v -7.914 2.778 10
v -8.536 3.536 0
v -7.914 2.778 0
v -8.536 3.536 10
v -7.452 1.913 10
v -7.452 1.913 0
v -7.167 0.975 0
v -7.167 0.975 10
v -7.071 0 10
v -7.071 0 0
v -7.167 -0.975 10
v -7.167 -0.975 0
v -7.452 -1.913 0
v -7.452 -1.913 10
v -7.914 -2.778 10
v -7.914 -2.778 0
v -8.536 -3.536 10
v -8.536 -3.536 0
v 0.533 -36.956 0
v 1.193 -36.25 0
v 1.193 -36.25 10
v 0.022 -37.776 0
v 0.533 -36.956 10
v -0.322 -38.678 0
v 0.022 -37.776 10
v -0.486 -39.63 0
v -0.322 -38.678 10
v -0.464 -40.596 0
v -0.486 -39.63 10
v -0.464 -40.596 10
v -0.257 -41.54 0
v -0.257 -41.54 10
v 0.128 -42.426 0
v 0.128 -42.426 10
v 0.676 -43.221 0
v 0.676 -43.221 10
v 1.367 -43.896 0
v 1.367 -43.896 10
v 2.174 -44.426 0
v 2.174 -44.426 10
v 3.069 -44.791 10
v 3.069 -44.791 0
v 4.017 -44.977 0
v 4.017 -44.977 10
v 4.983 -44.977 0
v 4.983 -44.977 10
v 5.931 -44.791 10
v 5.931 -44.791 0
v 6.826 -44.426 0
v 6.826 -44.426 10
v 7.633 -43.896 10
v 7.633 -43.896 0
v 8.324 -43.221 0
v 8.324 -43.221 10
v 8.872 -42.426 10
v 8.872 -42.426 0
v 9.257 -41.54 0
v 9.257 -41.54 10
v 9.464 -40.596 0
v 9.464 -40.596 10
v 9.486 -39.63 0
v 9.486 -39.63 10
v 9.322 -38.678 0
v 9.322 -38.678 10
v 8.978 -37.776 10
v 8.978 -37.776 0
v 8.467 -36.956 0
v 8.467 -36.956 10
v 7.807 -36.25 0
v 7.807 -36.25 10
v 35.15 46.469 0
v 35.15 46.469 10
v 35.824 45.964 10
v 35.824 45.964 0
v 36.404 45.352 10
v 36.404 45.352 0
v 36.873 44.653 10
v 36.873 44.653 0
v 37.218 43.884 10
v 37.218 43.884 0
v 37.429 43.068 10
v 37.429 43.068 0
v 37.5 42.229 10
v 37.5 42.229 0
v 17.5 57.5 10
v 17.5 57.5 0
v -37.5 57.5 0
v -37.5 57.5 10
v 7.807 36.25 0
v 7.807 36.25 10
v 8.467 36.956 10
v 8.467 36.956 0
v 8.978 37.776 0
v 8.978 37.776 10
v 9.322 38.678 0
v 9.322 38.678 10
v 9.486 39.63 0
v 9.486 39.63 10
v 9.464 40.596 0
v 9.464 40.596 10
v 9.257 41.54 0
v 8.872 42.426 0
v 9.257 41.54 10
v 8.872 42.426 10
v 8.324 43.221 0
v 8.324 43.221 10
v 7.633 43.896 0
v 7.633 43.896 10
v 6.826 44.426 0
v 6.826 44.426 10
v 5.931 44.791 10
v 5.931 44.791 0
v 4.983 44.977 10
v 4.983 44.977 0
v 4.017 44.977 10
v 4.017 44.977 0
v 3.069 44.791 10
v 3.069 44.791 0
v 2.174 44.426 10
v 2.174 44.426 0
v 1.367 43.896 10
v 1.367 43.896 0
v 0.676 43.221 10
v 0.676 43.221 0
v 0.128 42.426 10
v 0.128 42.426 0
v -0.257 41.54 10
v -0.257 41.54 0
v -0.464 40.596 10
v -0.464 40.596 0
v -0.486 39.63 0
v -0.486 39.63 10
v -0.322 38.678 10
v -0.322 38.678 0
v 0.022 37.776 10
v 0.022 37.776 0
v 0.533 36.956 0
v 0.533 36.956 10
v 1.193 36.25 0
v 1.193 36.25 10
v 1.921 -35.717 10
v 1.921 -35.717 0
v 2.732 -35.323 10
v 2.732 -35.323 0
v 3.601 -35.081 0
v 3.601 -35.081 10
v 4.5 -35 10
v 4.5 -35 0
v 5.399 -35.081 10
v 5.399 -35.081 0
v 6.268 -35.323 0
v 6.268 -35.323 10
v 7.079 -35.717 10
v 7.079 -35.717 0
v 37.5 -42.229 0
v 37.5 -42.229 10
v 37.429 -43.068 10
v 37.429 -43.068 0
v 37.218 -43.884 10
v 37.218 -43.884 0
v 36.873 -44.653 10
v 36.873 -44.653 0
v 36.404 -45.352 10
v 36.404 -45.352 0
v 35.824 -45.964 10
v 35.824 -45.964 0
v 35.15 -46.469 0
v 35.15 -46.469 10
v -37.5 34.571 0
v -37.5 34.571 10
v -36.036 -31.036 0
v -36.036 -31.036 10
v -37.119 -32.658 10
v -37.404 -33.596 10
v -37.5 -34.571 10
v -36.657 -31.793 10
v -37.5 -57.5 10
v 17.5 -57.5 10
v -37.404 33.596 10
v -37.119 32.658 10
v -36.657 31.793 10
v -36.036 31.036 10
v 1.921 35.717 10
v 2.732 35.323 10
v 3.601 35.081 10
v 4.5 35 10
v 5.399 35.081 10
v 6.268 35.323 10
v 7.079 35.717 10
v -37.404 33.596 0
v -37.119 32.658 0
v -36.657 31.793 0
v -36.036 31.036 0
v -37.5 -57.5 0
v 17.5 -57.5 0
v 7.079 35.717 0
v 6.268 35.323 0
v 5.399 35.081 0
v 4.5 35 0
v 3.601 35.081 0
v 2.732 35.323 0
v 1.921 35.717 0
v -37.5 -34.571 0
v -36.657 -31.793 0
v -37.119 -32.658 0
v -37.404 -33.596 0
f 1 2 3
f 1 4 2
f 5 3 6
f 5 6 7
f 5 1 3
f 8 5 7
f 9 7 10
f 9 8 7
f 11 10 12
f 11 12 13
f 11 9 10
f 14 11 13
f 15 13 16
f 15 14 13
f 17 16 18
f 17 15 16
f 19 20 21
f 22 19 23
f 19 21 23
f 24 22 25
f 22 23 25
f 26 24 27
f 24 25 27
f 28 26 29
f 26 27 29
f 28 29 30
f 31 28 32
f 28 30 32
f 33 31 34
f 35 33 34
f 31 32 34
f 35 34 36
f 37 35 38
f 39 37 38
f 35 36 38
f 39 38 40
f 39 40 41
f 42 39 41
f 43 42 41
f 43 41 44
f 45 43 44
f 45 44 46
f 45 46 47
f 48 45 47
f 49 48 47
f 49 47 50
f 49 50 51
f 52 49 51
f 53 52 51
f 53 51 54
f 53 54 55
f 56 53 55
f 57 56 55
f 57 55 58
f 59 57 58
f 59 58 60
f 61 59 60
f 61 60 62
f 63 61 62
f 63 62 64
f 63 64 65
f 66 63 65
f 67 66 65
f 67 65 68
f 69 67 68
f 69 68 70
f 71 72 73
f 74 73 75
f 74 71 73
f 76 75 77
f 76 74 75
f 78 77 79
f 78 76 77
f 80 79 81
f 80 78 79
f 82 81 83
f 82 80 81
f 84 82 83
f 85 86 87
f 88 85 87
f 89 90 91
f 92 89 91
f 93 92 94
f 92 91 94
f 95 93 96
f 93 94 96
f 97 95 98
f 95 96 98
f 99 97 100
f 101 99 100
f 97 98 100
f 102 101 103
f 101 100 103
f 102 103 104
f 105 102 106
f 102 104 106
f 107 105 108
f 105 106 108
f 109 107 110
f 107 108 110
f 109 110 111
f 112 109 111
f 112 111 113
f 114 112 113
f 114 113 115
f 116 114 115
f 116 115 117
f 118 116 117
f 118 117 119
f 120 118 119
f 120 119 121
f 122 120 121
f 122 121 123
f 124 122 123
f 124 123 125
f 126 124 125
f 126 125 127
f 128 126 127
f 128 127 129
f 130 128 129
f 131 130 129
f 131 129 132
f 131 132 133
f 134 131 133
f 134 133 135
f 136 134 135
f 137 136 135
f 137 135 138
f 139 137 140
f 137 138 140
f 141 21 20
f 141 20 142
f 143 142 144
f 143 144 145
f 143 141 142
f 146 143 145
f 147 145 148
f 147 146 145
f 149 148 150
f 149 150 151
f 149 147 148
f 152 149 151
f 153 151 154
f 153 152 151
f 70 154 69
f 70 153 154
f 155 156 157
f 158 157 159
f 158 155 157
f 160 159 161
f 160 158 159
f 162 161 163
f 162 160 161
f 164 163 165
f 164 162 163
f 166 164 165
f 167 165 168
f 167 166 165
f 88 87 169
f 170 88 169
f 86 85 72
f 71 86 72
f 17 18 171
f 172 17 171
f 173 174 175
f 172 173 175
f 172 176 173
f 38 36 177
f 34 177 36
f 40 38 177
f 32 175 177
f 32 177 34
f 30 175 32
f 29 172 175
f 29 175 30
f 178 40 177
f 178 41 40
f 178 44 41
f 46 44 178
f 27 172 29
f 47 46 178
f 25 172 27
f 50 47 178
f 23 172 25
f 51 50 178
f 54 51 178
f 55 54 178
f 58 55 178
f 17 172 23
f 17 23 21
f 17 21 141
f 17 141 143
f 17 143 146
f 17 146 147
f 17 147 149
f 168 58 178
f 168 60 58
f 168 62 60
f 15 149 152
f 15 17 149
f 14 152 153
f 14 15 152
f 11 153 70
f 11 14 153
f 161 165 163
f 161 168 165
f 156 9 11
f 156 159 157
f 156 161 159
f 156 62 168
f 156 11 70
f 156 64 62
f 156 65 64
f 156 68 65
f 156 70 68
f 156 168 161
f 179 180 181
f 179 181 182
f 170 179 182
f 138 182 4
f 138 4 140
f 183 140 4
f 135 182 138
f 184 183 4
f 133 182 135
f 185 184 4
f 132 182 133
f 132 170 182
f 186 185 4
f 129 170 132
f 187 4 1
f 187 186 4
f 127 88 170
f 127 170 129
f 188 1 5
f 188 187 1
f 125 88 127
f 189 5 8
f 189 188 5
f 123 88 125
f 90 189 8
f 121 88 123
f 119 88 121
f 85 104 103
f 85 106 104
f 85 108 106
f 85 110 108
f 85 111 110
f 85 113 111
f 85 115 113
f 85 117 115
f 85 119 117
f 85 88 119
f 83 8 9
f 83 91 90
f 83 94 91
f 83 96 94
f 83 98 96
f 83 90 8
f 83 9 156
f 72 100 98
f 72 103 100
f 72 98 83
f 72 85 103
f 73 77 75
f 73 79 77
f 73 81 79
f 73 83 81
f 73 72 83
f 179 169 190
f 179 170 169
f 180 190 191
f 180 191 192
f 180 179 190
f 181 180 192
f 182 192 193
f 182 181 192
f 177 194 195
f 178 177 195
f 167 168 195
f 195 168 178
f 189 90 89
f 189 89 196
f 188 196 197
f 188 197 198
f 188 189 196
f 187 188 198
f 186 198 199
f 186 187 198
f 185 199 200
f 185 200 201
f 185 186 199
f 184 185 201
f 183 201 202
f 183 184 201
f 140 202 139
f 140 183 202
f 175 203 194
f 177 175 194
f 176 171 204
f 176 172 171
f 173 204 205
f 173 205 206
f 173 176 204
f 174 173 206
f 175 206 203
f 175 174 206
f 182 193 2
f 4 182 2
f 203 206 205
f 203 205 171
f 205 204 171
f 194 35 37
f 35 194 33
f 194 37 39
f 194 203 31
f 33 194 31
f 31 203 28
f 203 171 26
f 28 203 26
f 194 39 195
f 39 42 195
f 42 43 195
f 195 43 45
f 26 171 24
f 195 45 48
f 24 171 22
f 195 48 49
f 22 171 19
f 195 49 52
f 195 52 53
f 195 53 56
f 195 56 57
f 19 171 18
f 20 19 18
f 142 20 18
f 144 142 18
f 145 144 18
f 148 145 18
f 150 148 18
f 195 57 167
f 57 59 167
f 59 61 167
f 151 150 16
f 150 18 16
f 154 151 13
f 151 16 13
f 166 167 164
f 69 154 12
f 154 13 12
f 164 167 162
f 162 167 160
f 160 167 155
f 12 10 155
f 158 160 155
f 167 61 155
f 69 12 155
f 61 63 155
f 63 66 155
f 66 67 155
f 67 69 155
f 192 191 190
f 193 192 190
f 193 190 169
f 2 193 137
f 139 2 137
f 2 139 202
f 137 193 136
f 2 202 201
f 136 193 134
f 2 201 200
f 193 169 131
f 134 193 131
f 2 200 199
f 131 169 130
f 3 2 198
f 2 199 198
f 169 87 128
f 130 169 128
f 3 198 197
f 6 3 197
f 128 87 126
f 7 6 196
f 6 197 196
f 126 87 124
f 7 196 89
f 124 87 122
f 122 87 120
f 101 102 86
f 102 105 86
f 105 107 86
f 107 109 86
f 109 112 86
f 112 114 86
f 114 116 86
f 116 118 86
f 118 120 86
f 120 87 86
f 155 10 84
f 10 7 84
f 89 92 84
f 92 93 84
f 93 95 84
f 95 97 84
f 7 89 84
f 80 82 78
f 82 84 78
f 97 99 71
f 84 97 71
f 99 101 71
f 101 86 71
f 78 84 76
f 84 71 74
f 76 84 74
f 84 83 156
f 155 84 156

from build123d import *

# Parameters (mm, degrees)
EXTRUDE_1_DEPTH     = 10
FILLET_1_R          = 5
SKETCH_2_W          = 14.503098638
SKETCH_2_H          = 45
EXTRUDE_4_DEPTH     = 10
FILLET_3_R          = 5
SKETCH_3_R          = 5
CUT_EXTRUDE_2_DEPTH = 82.929848041
FILLET_4_R          = 5
SKETCH_4_R          = 5
CUT_EXTRUDE_5_DEPTH = 70.372184628
EXTRUDE_7_DEPTH     = 10


with BuildPart() as part:
    # 草图1 → 凸台-拉伸1 (new body)
    with BuildSketch(Plane.XY):
        Polygon((37.5, 57.5), (-37.5, 57.5), (-37.5, 32.5), (-5, 0), (-37.5, -32.5), (-37.5, -57.5), (37.5, -57.5), align=None)
    extrude(amount=EXTRUDE_1_DEPTH)

    # 圆角1
    fillet_1_edges = [part.edges().sort_by_distance(p)[0] for p in [
        (-5, 0, 5),
        (-37.5, 32.5, 5),
        (-37.5, -32.5, 5),
    ]]
    fillet(fillet_1_edges, radius=FILLET_1_R)

    # 草图2 → 凸台-拉伸4 (add)
    with BuildSketch(Plane.XY.offset(10)):
        Polygon((37.5, 57.5), (37.5, 0), (42.996901362, 0), (42.996901362, 45), (57.5, 45), align=None)
        with Locations((50.248450681, 22.5)):
            Rectangle(SKETCH_2_W, SKETCH_2_H)
        with Locations((50.248450681, -22.5)):
            Rectangle(SKETCH_2_W, SKETCH_2_H)
        Polygon((37.5, 0), (37.5, -57.5), (57.5, -45), (42.996901362, -45), (42.996901362, 0), align=None)
    extrude(amount=-EXTRUDE_4_DEPTH)

    # 圆角3
    fillet_3_edges = [part.edges().sort_by_distance(p)[0] for p in [
        (57.5, -45, 5),
        (57.5, 45, 5),
    ]]
    fillet(fillet_3_edges, radius=FILLET_3_R)

    # 草图3 → 切除-拉伸2 (cut, through all)
    with BuildSketch(Plane.XY.offset(10)):
        Polygon((17.5, 57.5), (37.5, 45), (37.5, 57.5), align=None)
        with BuildLine():
            Line((37.5, 57.5), (37.5, -57.5))
            Line((37.5, -57.5), (55.1499947, -46.468753312))
            ThreePointArc((55.1499947, -46.468753312), (56.873212406, -44.652604454), (57.5, -42.228761792))
            Line((57.5, -42.228761792), (57.5, 42.228761792))
            ThreePointArc((57.5, 42.228761792), (56.873212406, 44.652604454), (55.1499947, 46.468753312))
            Line((55.1499947, 46.468753312), (37.5, 57.5))
        make_face()
        Polygon((37.5, -45), (17.5, -57.5), (37.5, -57.5), align=None)
        with Locations((4.5, -32.5)):
            Circle(SKETCH_3_R)
        with Locations((4.5, 32.5)):
            Circle(SKETCH_3_R)
    extrude(amount=-CUT_EXTRUDE_2_DEPTH, mode=Mode.SUBTRACT)

    # 圆角4
    fillet_4_edges = [part.edges().sort_by_distance(p)[0] for p in [
        (37.5, -45, 5),
        (37.5, 45, 5),
    ]]
    fillet(fillet_4_edges, radius=FILLET_4_R)

    # 草图4 → 切除-拉伸5 (cut, through all)
    with BuildSketch(Plane.XY.offset(10)):
        with Locations((4.5, 40)):
            Circle(SKETCH_4_R)
        with Locations((4.5, 32.5)):
            Circle(SKETCH_4_R)
        with Locations((4.5, -40)):
            Circle(SKETCH_4_R)
        with Locations((4.5, -32.5)):
            Circle(SKETCH_4_R)
    extrude(amount=-CUT_EXTRUDE_5_DEPTH, mode=Mode.SUBTRACT)

    # 草图7 → 凸台-拉伸7 (add)
    with BuildSketch(Plane.XY.offset(10)):
        with BuildLine():
            ThreePointArc((1.192810861, 36.25), (2.442810861, 27.942810861), (9.5, 32.5))
            ThreePointArc((9.5, 32.5), (9.057189139, 34.557189139), (7.807189139, 36.25))
            ThreePointArc((7.807189139, 36.25), (4.5, 35), (1.192810861, 36.25))
        make_face()
        with BuildLine():
            ThreePointArc((7.807189139, -36.25), (9.057189139, -34.557189139), (9.5, -32.5))
            ThreePointArc((9.5, -32.5), (2.442810861, -27.942810861), (1.192810861, -36.25))
            ThreePointArc((1.192810861, -36.25), (4.5, -35), (7.807189139, -36.25))
        make_face()
    extrude(amount=-EXTRUDE_7_DEPTH)


solid = part.part
